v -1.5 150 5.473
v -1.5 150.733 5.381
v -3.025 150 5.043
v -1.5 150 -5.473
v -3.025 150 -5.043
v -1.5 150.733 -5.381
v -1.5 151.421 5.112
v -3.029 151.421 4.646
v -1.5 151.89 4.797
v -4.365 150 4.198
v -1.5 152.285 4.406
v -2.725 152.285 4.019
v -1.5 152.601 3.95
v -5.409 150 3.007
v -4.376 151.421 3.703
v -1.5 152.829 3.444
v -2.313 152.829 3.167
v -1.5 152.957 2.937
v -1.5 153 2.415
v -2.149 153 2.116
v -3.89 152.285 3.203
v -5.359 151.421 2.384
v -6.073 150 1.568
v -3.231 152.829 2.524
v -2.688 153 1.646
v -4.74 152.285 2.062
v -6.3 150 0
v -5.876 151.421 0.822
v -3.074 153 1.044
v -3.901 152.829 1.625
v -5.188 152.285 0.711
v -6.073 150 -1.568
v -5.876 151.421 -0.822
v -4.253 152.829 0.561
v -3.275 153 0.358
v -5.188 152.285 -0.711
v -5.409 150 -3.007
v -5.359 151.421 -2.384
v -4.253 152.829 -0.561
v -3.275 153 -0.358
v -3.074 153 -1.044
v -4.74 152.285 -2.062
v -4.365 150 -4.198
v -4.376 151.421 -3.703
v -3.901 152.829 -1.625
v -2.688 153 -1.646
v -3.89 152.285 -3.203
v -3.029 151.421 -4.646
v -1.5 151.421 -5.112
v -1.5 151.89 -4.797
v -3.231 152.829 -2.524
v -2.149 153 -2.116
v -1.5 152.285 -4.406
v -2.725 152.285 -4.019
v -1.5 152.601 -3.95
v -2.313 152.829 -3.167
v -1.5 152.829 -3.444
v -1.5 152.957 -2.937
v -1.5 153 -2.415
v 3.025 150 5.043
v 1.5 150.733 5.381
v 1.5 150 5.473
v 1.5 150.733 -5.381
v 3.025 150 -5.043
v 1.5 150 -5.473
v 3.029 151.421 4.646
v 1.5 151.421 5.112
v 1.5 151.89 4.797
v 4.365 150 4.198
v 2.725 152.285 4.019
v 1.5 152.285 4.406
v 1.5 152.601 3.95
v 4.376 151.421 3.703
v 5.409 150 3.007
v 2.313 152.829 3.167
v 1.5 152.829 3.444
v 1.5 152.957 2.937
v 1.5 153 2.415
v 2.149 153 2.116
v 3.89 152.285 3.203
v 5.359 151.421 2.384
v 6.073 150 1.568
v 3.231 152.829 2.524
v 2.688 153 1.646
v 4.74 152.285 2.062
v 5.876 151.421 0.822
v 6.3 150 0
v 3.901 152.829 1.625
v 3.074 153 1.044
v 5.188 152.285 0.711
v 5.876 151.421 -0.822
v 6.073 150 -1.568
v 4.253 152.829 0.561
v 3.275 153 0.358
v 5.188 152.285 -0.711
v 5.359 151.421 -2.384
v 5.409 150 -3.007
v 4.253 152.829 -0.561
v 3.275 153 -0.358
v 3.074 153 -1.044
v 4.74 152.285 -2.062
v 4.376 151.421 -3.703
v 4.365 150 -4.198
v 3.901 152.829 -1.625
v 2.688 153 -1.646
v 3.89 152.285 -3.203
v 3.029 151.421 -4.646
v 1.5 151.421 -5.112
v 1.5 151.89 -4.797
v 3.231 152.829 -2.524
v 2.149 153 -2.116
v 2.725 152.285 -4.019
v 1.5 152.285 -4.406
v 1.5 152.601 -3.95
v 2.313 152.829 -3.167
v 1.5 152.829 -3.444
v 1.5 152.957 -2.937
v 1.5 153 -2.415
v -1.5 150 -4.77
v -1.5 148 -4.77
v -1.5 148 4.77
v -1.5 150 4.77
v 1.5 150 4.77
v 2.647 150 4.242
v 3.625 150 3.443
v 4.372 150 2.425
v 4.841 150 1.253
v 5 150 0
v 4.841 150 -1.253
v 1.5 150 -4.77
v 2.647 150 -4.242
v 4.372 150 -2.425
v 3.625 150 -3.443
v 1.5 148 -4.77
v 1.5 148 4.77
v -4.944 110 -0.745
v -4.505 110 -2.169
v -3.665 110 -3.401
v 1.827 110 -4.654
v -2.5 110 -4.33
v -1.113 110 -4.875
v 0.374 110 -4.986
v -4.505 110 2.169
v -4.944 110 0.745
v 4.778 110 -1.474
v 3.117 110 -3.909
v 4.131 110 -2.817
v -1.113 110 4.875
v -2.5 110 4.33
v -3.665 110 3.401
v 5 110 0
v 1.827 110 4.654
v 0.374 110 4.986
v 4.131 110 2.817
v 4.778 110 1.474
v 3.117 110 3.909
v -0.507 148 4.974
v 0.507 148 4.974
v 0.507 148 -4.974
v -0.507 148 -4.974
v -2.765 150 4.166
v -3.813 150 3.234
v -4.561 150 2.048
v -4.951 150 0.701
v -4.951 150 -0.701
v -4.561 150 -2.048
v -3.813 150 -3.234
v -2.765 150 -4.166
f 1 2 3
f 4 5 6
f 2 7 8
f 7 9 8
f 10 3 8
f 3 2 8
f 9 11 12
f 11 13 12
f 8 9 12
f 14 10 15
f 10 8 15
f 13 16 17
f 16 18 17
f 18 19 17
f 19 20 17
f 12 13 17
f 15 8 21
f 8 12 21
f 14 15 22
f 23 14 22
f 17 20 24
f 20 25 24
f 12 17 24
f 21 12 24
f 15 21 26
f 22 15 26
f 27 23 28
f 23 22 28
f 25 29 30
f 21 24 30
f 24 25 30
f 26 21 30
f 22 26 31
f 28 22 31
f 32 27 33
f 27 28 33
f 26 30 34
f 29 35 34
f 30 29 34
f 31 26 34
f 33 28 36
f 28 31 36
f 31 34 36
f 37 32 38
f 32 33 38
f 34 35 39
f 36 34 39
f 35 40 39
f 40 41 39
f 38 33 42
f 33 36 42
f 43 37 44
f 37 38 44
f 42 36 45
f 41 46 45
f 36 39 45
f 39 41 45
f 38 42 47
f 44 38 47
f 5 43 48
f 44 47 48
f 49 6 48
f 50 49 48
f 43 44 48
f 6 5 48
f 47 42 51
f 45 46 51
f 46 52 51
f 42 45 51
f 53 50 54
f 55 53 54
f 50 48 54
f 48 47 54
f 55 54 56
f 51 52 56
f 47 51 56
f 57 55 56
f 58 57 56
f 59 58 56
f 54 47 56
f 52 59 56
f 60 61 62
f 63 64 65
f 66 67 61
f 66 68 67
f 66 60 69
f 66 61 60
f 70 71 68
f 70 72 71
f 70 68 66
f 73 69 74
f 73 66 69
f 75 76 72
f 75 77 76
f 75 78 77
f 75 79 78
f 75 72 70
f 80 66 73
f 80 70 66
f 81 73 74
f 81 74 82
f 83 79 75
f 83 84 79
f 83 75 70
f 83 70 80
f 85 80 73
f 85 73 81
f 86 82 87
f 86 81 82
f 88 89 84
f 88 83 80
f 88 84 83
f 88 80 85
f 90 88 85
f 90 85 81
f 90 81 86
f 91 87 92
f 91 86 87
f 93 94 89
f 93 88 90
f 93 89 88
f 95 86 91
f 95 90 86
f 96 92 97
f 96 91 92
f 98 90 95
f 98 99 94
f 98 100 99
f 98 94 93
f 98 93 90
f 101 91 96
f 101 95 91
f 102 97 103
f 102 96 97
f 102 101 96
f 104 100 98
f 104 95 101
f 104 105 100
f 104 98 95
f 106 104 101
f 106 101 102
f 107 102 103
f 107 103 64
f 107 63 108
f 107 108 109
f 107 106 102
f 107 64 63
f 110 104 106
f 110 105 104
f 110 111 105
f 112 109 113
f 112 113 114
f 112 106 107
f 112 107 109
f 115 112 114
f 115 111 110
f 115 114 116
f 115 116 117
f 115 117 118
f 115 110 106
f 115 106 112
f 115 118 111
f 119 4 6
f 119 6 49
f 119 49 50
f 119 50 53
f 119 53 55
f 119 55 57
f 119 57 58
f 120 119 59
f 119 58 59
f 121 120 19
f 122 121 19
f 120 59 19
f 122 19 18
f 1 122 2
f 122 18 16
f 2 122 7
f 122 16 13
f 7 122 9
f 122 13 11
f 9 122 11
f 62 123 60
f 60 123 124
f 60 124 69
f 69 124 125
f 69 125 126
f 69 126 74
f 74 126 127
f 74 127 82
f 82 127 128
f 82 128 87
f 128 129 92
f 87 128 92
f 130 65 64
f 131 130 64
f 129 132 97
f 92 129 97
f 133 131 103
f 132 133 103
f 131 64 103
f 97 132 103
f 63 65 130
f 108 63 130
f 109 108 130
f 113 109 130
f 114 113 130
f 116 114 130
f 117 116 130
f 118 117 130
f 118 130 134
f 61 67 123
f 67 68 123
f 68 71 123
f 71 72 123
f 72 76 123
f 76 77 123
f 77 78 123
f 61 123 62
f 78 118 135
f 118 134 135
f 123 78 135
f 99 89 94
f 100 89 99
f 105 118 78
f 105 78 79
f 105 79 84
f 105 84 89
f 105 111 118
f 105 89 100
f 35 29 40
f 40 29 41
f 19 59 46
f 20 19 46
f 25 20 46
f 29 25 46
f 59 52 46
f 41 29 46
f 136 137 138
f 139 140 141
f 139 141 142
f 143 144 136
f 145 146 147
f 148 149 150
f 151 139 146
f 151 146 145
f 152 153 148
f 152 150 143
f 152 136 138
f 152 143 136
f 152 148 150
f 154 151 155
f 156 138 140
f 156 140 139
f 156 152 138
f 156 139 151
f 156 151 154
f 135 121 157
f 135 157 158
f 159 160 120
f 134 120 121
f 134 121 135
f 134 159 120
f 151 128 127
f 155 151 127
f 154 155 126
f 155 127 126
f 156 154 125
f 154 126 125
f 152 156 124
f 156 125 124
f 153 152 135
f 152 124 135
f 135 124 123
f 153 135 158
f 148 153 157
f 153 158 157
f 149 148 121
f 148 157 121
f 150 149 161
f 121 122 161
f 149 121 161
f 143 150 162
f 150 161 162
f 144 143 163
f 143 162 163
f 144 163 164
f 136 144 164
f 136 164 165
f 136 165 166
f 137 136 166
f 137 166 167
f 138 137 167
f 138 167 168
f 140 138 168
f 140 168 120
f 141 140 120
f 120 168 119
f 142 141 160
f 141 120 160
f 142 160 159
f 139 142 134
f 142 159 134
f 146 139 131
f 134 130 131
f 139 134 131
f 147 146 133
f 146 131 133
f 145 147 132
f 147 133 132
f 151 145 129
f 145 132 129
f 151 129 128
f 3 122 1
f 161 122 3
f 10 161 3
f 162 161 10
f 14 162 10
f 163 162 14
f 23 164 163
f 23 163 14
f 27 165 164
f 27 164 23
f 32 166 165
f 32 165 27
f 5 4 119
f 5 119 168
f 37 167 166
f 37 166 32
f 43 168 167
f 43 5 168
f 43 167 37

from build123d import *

# Parameters (mm, degrees)
BOSS_EXTRUDE1_START     = -40
BOSS_EXTRUDE1_OUTLINE_R = 5
BOSS_EXTRUDE1_DEPTH     = 40
CUT_EXTRUDE1_DEPTH      = 2
BOSS_EXTRUDE2_DEPTH     = 3
FILLET1_R               = 3


# Read off the part's stored shape, not the designer's step: Boss-Extrude1
with BuildPart() as part:
    # Boss-Extrude1 outline → Boss-Extrude1 (new body)
    with BuildSketch(Plane.XZ.offset(-110).offset(BOSS_EXTRUDE1_START)):
        Circle(BOSS_EXTRUDE1_OUTLINE_R)
    extrude(amount=BOSS_EXTRUDE1_DEPTH)

    # Sketch12 → Cut-Extrude1 (cut)
    with BuildSketch(Plane(origin=(0, 150, 0), x_dir=(1, 0, 0), z_dir=(0, 1, 0))):
        with BuildLine():
            Line((1.5, -4.769696007), (1.5, 4.769696007))
            ThreePointArc((1.5, 4.769696007), (0, 5), (-1.5, 4.769696007))
            Line((-1.5, 4.769696007), (-1.5, -4.769696007))
            ThreePointArc((-1.5, -4.769696007), (0, -5), (1.5, -4.769696007))
        make_face()
    extrude(amount=-CUT_EXTRUDE1_DEPTH, mode=Mode.SUBTRACT)

    # Sketch13 → Boss-Extrude2 (add)
    with BuildSketch(Plane(origin=(0, 150, 0), x_dir=(1, 0, 0), z_dir=(0, 1, 0))):
        with BuildLine():
            Line((1.5, 5.473173211), (1.5, -5.473173211))
            ThreePointArc((1.5, -5.473173211), (6.3, 0), (1.5, 5.473173211))
        make_face()
        with BuildLine():
            Line((-1.5, 5.473173211), (-1.5, -5.473173211))
            ThreePointArc((-1.5, -5.473173211), (-6.3, 0), (-1.5, 5.473173211))
        make_face()
    extrude(amount=BOSS_EXTRUDE2_DEPTH)

    # Fillet1
    fillet1_edges = [part.edges().sort_by_distance(p)[0] for p in [
        (-6.3, 153, 0),
        (6.3, 153, 0),
    ]]
    fillet(fillet1_edges, radius=FILLET1_R - 0.0001)  # a hair under: the kernel refuses the full size


solid = part.part
